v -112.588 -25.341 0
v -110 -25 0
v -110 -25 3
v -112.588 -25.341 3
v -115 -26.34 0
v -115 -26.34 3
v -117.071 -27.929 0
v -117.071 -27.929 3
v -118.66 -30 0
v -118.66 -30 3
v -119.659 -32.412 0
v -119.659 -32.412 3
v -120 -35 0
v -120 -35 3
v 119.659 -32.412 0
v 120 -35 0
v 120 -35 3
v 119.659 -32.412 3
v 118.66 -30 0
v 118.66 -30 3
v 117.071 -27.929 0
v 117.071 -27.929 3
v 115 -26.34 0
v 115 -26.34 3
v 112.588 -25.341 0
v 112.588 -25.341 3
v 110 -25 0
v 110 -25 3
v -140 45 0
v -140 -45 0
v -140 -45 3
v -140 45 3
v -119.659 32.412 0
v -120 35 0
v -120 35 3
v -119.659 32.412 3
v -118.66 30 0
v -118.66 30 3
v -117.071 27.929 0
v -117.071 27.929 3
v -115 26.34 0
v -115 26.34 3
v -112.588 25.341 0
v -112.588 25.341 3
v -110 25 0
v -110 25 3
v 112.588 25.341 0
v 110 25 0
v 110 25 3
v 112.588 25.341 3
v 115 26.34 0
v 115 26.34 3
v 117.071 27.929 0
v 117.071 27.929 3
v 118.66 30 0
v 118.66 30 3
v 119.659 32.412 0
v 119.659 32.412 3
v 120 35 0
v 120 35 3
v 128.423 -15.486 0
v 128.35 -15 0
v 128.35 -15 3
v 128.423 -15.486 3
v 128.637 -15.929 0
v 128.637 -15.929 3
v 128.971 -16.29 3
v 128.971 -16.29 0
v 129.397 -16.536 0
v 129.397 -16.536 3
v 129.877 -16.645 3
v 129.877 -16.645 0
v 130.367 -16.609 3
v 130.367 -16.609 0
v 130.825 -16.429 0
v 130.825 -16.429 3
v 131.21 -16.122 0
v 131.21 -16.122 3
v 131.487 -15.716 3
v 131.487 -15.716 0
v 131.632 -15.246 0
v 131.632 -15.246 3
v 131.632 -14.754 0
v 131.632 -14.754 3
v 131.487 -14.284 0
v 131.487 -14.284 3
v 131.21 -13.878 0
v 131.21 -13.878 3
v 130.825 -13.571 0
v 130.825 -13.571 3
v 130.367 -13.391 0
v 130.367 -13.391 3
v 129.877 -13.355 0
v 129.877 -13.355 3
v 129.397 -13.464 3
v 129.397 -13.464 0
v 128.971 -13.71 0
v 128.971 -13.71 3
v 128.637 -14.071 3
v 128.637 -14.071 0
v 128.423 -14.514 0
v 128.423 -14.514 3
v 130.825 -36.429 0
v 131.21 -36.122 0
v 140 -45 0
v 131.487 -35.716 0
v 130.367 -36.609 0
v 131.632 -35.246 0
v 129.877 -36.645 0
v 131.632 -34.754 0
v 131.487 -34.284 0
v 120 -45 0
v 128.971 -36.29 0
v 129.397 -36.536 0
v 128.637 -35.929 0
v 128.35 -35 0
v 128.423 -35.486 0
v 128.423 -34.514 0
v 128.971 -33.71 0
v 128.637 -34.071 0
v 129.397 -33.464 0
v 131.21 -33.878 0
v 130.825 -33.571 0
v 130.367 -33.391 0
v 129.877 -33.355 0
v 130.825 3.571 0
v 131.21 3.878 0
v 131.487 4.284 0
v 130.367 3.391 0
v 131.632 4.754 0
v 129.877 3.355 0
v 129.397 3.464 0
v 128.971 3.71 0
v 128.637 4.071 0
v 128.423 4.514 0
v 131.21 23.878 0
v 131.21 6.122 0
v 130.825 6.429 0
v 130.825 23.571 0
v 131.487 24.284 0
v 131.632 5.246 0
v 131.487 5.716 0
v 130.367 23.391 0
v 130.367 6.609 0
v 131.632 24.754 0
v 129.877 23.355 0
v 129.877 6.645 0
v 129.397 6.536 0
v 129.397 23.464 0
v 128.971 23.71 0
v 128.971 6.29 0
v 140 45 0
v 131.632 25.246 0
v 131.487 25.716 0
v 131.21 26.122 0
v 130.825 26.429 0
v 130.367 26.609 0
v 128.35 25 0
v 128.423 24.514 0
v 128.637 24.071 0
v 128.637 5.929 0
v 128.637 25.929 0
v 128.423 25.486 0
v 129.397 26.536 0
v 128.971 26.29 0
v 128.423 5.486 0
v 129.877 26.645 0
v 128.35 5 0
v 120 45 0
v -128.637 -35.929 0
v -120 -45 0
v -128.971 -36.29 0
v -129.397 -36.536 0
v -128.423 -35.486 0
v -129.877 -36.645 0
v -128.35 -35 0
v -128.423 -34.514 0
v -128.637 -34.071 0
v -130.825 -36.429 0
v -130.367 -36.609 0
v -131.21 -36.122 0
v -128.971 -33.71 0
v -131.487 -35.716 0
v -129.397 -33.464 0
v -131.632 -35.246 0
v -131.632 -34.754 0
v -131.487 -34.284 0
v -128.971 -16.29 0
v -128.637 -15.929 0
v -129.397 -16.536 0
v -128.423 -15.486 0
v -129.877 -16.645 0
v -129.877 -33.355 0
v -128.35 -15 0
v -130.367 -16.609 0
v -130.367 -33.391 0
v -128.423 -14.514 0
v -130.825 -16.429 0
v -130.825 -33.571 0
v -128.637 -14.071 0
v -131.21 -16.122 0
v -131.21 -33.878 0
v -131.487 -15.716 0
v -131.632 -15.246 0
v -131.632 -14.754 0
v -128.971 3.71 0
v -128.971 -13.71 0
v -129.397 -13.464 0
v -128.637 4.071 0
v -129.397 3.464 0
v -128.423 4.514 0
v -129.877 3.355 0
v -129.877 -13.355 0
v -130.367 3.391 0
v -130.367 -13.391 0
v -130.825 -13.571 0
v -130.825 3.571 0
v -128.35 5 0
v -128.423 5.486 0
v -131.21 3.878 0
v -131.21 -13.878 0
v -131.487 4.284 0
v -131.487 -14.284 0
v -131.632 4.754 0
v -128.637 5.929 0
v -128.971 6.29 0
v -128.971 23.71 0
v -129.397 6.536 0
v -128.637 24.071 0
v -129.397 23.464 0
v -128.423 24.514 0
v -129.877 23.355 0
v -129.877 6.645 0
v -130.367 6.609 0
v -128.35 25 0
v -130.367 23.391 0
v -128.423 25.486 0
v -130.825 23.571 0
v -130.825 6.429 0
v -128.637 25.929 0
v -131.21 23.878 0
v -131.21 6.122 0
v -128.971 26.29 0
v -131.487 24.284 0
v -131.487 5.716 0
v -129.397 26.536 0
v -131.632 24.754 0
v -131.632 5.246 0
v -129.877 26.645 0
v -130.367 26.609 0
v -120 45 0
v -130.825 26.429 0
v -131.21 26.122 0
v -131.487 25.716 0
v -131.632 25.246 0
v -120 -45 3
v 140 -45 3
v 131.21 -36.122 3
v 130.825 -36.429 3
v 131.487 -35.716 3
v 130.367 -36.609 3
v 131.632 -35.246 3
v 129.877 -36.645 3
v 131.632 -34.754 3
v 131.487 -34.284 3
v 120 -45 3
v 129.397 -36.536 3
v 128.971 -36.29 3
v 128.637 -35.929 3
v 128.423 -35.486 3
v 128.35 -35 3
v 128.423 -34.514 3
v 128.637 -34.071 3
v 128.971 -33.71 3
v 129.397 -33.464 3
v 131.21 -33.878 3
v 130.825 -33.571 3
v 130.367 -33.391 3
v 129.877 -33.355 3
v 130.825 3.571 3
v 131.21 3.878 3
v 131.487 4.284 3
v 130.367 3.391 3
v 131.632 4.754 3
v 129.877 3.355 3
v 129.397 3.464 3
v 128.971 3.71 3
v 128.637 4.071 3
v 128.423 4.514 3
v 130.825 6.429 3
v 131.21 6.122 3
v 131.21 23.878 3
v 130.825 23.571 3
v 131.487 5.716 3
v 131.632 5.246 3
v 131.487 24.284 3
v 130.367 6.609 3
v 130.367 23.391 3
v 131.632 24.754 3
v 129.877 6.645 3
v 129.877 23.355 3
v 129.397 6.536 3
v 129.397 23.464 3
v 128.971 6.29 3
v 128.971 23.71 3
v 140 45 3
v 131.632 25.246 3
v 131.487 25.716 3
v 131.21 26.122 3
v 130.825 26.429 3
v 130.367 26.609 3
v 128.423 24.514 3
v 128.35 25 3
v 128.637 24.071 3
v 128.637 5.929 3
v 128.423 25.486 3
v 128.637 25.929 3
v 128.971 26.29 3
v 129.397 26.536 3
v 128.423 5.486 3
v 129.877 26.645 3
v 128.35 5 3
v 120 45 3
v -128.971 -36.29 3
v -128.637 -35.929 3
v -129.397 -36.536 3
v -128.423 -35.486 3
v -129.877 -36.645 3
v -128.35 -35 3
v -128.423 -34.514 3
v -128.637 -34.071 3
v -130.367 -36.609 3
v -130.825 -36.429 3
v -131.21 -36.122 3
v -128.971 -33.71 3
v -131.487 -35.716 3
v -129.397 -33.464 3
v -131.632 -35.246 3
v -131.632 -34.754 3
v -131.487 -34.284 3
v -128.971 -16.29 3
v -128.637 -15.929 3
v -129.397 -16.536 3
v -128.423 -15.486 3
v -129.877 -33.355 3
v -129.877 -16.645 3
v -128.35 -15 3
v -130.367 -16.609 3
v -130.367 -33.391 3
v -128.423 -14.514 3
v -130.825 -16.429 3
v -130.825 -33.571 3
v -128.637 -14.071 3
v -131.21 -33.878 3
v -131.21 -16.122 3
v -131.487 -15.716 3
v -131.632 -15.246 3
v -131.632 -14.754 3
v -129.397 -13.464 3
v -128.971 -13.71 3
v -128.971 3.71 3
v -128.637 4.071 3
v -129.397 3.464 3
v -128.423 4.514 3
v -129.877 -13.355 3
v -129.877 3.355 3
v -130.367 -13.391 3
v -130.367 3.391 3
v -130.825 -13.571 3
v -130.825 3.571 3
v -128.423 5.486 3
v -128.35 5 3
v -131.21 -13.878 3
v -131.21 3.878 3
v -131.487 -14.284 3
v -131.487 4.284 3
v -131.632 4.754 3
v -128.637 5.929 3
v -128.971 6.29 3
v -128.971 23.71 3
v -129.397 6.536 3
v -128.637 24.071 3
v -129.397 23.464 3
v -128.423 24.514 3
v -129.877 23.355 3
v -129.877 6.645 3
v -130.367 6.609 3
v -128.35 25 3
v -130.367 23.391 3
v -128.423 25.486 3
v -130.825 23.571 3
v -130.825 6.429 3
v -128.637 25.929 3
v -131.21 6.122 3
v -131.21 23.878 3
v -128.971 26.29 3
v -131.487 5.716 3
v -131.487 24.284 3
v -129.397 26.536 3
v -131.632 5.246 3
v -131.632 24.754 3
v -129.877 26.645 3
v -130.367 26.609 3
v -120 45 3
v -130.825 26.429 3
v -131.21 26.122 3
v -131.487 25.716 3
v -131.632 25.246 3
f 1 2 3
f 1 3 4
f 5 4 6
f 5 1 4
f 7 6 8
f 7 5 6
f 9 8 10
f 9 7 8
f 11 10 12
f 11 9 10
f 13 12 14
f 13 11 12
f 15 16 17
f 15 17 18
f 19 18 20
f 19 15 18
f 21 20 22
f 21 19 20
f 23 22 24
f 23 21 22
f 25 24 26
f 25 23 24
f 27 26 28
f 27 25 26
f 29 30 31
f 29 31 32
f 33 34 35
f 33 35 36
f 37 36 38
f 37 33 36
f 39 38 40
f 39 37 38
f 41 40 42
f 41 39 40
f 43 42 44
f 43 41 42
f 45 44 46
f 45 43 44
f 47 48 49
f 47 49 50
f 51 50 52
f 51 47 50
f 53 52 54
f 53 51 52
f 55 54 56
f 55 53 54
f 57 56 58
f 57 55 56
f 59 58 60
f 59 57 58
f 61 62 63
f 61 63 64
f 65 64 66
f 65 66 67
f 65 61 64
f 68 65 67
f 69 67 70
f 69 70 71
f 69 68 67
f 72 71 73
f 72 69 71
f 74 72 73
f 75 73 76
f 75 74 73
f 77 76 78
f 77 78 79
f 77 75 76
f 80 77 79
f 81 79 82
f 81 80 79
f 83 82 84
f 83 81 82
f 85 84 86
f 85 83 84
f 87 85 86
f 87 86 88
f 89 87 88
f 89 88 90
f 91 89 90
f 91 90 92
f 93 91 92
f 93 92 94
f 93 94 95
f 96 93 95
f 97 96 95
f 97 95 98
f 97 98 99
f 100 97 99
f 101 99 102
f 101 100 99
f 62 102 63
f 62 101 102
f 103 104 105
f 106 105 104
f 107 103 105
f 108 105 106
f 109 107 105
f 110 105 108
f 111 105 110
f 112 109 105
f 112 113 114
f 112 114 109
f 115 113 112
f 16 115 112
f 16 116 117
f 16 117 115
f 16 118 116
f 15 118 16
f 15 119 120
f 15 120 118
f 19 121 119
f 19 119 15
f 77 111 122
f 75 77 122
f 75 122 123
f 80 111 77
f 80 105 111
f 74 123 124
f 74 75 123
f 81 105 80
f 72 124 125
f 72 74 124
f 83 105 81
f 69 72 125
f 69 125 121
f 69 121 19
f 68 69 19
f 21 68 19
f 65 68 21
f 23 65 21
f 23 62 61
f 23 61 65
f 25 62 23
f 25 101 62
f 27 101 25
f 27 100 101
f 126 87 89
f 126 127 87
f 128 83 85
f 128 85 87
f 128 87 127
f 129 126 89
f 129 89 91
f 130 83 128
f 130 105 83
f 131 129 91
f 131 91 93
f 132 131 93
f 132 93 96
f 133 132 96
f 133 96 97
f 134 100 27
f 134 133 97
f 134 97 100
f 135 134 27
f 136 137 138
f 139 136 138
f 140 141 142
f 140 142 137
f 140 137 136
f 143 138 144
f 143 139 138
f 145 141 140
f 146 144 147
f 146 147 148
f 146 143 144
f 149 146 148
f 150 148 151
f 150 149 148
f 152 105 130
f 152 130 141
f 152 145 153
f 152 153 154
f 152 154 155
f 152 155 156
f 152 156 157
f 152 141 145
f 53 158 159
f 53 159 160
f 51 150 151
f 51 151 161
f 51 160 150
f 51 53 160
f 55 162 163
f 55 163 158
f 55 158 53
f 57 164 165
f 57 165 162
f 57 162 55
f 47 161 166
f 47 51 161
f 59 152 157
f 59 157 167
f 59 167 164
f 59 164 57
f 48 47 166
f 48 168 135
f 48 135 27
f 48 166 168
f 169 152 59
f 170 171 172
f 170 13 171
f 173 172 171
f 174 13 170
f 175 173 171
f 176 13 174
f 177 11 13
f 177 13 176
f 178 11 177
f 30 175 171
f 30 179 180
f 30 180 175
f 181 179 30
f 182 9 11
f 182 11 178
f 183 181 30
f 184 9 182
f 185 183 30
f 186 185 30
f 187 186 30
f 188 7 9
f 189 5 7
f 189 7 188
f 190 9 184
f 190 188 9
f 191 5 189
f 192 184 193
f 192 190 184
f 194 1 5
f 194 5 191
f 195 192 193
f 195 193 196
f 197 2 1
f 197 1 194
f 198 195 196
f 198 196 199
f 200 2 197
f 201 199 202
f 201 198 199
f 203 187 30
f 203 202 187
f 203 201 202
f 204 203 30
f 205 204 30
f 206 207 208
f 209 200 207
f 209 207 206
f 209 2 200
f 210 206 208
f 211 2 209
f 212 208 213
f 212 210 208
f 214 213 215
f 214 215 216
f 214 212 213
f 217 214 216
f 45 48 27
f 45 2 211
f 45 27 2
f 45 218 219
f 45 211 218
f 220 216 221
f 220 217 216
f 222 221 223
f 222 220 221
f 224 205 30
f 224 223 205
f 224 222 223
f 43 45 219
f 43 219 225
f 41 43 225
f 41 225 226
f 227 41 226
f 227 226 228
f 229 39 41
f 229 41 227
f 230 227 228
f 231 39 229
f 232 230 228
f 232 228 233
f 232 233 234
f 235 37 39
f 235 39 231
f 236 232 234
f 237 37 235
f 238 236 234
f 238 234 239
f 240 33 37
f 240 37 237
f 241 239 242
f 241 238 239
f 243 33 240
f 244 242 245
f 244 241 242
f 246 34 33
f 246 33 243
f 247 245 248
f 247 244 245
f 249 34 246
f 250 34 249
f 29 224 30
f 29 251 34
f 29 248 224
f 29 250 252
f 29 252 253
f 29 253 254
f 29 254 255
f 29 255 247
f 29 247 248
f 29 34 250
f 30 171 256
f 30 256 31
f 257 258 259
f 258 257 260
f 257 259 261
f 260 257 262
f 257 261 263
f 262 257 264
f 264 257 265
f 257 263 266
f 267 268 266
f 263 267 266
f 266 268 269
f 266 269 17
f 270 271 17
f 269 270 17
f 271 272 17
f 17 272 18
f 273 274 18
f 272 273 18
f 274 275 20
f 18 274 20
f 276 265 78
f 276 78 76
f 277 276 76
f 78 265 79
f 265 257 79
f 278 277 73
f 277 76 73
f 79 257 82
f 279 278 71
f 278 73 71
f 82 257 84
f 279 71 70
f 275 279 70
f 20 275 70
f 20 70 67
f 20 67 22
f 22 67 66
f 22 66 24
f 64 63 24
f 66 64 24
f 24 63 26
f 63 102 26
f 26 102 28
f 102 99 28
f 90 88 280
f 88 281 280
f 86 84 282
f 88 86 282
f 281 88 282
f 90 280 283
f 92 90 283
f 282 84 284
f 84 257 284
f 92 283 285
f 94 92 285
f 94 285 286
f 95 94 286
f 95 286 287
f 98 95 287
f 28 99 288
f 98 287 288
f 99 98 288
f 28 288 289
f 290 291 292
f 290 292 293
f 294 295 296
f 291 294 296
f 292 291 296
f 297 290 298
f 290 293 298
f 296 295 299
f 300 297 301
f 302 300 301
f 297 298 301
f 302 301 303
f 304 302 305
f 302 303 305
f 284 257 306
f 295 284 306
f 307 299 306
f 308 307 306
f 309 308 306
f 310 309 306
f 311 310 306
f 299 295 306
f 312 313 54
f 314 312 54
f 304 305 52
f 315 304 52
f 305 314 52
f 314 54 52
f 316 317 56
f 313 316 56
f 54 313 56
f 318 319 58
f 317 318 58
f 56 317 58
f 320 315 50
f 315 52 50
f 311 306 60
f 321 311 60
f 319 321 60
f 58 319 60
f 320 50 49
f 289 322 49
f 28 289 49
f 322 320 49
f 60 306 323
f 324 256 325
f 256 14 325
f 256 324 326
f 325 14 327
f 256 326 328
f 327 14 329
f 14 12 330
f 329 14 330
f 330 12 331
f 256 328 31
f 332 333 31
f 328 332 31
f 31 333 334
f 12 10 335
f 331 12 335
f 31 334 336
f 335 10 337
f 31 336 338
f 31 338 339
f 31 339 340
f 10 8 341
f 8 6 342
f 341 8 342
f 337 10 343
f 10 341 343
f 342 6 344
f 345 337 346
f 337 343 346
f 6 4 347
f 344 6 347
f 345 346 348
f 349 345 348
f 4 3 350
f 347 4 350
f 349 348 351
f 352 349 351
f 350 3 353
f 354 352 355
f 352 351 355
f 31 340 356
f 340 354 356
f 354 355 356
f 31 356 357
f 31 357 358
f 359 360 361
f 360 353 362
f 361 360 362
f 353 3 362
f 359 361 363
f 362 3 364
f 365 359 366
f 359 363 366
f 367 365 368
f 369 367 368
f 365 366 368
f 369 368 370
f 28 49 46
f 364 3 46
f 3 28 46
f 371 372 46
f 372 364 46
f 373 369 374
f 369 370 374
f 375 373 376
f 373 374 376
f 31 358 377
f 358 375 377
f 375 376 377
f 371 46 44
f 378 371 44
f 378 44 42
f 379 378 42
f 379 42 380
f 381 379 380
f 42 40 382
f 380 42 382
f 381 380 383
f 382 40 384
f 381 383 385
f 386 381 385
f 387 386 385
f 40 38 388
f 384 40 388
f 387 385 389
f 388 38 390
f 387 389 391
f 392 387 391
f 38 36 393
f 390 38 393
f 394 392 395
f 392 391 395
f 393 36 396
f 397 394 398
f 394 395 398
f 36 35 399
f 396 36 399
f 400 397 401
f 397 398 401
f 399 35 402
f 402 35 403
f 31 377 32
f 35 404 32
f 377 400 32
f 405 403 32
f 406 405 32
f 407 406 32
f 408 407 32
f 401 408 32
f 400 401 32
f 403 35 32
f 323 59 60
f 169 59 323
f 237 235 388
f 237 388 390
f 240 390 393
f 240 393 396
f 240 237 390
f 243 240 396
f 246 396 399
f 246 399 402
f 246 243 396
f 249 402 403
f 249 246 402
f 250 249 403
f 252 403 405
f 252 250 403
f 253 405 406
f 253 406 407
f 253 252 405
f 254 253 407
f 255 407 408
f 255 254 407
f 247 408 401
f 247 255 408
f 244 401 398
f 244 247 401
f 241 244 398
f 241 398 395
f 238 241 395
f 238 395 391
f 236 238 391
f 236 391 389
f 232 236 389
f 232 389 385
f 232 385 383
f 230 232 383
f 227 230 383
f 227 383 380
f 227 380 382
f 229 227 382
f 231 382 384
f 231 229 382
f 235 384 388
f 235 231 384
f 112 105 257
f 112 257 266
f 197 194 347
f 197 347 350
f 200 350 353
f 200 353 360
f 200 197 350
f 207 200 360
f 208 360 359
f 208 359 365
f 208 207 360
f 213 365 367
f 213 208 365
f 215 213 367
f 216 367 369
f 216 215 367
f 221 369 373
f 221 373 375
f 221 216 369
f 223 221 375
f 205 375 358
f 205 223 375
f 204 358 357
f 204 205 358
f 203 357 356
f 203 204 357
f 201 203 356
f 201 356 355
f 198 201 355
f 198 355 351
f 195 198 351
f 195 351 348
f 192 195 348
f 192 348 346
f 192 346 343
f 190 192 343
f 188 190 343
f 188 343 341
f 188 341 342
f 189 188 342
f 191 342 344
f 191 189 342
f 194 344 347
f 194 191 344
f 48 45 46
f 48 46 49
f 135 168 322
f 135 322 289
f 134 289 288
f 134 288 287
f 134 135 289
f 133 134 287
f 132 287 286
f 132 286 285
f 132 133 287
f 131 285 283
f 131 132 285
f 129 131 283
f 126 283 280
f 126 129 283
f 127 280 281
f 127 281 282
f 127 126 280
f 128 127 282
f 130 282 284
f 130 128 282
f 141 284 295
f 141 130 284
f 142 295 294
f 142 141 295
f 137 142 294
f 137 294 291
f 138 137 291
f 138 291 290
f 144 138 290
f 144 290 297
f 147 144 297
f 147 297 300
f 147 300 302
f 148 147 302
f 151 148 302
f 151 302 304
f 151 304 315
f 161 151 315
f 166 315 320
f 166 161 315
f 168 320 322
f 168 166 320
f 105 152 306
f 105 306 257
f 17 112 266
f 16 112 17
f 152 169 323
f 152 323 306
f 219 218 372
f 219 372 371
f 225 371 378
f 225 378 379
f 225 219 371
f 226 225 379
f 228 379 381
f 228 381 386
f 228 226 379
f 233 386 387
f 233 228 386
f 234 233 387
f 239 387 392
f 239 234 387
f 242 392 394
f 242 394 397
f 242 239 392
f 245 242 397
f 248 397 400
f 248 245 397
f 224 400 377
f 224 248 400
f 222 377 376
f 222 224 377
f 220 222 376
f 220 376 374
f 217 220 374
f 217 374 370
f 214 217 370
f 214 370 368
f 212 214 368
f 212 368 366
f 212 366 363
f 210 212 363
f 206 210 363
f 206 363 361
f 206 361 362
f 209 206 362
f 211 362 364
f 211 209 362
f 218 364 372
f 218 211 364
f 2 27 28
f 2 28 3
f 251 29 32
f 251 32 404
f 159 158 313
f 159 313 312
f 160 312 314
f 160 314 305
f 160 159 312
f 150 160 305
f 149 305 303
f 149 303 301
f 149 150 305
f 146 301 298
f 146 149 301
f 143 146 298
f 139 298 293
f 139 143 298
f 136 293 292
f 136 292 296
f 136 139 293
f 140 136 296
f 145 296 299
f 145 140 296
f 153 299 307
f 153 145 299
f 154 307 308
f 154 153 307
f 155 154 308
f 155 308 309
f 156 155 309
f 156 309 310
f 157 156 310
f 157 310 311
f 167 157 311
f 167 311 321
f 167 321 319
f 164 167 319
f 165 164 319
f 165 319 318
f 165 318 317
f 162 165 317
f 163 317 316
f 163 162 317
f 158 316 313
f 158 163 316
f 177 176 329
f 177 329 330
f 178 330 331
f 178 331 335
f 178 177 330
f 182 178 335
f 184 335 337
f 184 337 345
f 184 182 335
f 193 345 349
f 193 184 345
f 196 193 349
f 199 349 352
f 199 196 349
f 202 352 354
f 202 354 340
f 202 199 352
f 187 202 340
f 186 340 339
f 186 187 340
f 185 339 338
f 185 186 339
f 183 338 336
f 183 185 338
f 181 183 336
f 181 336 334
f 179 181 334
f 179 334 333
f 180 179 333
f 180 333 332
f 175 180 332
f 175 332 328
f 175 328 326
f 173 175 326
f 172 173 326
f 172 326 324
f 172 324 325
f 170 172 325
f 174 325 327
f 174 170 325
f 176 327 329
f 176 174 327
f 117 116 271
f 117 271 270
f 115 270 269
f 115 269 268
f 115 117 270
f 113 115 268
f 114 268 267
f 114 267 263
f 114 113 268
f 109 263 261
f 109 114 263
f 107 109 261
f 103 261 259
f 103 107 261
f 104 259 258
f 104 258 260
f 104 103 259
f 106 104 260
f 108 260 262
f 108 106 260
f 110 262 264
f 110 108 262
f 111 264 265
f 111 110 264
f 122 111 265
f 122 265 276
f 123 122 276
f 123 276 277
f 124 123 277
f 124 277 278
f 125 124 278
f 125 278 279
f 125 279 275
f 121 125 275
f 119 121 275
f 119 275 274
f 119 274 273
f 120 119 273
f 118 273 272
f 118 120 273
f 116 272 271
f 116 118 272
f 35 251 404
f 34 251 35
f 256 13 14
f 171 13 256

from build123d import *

# Parameters (mm, degrees)
SKETCH_1_R      = 1.65
EXTRUDE_1_DEPTH = 3


with BuildPart() as part:
    # 草图1 → 凸台-拉伸1 (new body)
    with BuildSketch(Plane.XY):
        with BuildLine():
            Line((-110, 25), (110, 25))
            ThreePointArc((110, 25), (117.071067812, 27.928932188), (120, 35))
            Line((120, 35), (120, 45))
            Line((120, 45), (140, 45))
            Line((140, 45), (140, -45))
            Line((140, -45), (120, -45))
            Line((120, -45), (120, -35))
            ThreePointArc((120, -35), (117.071067812, -27.928932188), (110, -25))
            Line((110, -25), (-110, -25))
            ThreePointArc((-110, -25), (-117.071067812, -27.928932188), (-120, -35))
            Line((-120, -35), (-120, -45))
            Line((-120, -45), (-140, -45))
            Line((-140, -45), (-140, 45))
            Line((-140, 45), (-120, 45))
            Line((-120, 45), (-120, 35))
            ThreePointArc((-120, 35), (-117.071067812, 27.928932188), (-110, 25))
        make_face()
        with Locations((-130, 25)):
            Circle(SKETCH_1_R, mode=Mode.SUBTRACT)
        with Locations((-130, 5)):
            Circle(SKETCH_1_R, mode=Mode.SUBTRACT)
        with Locations((-130, -15)):
            Circle(SKETCH_1_R, mode=Mode.SUBTRACT)
        with Locations((-130, -35)):
            Circle(SKETCH_1_R, mode=Mode.SUBTRACT)
        with Locations(Location((130, -35, 0), (0, 0, 180))):
            Circle(SKETCH_1_R, mode=Mode.SUBTRACT)
        with Locations(Location((130, -15, 0), (0, 0, 180))):
            Circle(SKETCH_1_R, mode=Mode.SUBTRACT)
        with Locations(Location((130, 5, 0), (0, 0, 180))):
            Circle(SKETCH_1_R, mode=Mode.SUBTRACT)
        with Locations(Location((130, 25, 0), (0, 0, 180))):
            Circle(SKETCH_1_R, mode=Mode.SUBTRACT)
    extrude(amount=EXTRUDE_1_DEPTH)


solid = part.part
